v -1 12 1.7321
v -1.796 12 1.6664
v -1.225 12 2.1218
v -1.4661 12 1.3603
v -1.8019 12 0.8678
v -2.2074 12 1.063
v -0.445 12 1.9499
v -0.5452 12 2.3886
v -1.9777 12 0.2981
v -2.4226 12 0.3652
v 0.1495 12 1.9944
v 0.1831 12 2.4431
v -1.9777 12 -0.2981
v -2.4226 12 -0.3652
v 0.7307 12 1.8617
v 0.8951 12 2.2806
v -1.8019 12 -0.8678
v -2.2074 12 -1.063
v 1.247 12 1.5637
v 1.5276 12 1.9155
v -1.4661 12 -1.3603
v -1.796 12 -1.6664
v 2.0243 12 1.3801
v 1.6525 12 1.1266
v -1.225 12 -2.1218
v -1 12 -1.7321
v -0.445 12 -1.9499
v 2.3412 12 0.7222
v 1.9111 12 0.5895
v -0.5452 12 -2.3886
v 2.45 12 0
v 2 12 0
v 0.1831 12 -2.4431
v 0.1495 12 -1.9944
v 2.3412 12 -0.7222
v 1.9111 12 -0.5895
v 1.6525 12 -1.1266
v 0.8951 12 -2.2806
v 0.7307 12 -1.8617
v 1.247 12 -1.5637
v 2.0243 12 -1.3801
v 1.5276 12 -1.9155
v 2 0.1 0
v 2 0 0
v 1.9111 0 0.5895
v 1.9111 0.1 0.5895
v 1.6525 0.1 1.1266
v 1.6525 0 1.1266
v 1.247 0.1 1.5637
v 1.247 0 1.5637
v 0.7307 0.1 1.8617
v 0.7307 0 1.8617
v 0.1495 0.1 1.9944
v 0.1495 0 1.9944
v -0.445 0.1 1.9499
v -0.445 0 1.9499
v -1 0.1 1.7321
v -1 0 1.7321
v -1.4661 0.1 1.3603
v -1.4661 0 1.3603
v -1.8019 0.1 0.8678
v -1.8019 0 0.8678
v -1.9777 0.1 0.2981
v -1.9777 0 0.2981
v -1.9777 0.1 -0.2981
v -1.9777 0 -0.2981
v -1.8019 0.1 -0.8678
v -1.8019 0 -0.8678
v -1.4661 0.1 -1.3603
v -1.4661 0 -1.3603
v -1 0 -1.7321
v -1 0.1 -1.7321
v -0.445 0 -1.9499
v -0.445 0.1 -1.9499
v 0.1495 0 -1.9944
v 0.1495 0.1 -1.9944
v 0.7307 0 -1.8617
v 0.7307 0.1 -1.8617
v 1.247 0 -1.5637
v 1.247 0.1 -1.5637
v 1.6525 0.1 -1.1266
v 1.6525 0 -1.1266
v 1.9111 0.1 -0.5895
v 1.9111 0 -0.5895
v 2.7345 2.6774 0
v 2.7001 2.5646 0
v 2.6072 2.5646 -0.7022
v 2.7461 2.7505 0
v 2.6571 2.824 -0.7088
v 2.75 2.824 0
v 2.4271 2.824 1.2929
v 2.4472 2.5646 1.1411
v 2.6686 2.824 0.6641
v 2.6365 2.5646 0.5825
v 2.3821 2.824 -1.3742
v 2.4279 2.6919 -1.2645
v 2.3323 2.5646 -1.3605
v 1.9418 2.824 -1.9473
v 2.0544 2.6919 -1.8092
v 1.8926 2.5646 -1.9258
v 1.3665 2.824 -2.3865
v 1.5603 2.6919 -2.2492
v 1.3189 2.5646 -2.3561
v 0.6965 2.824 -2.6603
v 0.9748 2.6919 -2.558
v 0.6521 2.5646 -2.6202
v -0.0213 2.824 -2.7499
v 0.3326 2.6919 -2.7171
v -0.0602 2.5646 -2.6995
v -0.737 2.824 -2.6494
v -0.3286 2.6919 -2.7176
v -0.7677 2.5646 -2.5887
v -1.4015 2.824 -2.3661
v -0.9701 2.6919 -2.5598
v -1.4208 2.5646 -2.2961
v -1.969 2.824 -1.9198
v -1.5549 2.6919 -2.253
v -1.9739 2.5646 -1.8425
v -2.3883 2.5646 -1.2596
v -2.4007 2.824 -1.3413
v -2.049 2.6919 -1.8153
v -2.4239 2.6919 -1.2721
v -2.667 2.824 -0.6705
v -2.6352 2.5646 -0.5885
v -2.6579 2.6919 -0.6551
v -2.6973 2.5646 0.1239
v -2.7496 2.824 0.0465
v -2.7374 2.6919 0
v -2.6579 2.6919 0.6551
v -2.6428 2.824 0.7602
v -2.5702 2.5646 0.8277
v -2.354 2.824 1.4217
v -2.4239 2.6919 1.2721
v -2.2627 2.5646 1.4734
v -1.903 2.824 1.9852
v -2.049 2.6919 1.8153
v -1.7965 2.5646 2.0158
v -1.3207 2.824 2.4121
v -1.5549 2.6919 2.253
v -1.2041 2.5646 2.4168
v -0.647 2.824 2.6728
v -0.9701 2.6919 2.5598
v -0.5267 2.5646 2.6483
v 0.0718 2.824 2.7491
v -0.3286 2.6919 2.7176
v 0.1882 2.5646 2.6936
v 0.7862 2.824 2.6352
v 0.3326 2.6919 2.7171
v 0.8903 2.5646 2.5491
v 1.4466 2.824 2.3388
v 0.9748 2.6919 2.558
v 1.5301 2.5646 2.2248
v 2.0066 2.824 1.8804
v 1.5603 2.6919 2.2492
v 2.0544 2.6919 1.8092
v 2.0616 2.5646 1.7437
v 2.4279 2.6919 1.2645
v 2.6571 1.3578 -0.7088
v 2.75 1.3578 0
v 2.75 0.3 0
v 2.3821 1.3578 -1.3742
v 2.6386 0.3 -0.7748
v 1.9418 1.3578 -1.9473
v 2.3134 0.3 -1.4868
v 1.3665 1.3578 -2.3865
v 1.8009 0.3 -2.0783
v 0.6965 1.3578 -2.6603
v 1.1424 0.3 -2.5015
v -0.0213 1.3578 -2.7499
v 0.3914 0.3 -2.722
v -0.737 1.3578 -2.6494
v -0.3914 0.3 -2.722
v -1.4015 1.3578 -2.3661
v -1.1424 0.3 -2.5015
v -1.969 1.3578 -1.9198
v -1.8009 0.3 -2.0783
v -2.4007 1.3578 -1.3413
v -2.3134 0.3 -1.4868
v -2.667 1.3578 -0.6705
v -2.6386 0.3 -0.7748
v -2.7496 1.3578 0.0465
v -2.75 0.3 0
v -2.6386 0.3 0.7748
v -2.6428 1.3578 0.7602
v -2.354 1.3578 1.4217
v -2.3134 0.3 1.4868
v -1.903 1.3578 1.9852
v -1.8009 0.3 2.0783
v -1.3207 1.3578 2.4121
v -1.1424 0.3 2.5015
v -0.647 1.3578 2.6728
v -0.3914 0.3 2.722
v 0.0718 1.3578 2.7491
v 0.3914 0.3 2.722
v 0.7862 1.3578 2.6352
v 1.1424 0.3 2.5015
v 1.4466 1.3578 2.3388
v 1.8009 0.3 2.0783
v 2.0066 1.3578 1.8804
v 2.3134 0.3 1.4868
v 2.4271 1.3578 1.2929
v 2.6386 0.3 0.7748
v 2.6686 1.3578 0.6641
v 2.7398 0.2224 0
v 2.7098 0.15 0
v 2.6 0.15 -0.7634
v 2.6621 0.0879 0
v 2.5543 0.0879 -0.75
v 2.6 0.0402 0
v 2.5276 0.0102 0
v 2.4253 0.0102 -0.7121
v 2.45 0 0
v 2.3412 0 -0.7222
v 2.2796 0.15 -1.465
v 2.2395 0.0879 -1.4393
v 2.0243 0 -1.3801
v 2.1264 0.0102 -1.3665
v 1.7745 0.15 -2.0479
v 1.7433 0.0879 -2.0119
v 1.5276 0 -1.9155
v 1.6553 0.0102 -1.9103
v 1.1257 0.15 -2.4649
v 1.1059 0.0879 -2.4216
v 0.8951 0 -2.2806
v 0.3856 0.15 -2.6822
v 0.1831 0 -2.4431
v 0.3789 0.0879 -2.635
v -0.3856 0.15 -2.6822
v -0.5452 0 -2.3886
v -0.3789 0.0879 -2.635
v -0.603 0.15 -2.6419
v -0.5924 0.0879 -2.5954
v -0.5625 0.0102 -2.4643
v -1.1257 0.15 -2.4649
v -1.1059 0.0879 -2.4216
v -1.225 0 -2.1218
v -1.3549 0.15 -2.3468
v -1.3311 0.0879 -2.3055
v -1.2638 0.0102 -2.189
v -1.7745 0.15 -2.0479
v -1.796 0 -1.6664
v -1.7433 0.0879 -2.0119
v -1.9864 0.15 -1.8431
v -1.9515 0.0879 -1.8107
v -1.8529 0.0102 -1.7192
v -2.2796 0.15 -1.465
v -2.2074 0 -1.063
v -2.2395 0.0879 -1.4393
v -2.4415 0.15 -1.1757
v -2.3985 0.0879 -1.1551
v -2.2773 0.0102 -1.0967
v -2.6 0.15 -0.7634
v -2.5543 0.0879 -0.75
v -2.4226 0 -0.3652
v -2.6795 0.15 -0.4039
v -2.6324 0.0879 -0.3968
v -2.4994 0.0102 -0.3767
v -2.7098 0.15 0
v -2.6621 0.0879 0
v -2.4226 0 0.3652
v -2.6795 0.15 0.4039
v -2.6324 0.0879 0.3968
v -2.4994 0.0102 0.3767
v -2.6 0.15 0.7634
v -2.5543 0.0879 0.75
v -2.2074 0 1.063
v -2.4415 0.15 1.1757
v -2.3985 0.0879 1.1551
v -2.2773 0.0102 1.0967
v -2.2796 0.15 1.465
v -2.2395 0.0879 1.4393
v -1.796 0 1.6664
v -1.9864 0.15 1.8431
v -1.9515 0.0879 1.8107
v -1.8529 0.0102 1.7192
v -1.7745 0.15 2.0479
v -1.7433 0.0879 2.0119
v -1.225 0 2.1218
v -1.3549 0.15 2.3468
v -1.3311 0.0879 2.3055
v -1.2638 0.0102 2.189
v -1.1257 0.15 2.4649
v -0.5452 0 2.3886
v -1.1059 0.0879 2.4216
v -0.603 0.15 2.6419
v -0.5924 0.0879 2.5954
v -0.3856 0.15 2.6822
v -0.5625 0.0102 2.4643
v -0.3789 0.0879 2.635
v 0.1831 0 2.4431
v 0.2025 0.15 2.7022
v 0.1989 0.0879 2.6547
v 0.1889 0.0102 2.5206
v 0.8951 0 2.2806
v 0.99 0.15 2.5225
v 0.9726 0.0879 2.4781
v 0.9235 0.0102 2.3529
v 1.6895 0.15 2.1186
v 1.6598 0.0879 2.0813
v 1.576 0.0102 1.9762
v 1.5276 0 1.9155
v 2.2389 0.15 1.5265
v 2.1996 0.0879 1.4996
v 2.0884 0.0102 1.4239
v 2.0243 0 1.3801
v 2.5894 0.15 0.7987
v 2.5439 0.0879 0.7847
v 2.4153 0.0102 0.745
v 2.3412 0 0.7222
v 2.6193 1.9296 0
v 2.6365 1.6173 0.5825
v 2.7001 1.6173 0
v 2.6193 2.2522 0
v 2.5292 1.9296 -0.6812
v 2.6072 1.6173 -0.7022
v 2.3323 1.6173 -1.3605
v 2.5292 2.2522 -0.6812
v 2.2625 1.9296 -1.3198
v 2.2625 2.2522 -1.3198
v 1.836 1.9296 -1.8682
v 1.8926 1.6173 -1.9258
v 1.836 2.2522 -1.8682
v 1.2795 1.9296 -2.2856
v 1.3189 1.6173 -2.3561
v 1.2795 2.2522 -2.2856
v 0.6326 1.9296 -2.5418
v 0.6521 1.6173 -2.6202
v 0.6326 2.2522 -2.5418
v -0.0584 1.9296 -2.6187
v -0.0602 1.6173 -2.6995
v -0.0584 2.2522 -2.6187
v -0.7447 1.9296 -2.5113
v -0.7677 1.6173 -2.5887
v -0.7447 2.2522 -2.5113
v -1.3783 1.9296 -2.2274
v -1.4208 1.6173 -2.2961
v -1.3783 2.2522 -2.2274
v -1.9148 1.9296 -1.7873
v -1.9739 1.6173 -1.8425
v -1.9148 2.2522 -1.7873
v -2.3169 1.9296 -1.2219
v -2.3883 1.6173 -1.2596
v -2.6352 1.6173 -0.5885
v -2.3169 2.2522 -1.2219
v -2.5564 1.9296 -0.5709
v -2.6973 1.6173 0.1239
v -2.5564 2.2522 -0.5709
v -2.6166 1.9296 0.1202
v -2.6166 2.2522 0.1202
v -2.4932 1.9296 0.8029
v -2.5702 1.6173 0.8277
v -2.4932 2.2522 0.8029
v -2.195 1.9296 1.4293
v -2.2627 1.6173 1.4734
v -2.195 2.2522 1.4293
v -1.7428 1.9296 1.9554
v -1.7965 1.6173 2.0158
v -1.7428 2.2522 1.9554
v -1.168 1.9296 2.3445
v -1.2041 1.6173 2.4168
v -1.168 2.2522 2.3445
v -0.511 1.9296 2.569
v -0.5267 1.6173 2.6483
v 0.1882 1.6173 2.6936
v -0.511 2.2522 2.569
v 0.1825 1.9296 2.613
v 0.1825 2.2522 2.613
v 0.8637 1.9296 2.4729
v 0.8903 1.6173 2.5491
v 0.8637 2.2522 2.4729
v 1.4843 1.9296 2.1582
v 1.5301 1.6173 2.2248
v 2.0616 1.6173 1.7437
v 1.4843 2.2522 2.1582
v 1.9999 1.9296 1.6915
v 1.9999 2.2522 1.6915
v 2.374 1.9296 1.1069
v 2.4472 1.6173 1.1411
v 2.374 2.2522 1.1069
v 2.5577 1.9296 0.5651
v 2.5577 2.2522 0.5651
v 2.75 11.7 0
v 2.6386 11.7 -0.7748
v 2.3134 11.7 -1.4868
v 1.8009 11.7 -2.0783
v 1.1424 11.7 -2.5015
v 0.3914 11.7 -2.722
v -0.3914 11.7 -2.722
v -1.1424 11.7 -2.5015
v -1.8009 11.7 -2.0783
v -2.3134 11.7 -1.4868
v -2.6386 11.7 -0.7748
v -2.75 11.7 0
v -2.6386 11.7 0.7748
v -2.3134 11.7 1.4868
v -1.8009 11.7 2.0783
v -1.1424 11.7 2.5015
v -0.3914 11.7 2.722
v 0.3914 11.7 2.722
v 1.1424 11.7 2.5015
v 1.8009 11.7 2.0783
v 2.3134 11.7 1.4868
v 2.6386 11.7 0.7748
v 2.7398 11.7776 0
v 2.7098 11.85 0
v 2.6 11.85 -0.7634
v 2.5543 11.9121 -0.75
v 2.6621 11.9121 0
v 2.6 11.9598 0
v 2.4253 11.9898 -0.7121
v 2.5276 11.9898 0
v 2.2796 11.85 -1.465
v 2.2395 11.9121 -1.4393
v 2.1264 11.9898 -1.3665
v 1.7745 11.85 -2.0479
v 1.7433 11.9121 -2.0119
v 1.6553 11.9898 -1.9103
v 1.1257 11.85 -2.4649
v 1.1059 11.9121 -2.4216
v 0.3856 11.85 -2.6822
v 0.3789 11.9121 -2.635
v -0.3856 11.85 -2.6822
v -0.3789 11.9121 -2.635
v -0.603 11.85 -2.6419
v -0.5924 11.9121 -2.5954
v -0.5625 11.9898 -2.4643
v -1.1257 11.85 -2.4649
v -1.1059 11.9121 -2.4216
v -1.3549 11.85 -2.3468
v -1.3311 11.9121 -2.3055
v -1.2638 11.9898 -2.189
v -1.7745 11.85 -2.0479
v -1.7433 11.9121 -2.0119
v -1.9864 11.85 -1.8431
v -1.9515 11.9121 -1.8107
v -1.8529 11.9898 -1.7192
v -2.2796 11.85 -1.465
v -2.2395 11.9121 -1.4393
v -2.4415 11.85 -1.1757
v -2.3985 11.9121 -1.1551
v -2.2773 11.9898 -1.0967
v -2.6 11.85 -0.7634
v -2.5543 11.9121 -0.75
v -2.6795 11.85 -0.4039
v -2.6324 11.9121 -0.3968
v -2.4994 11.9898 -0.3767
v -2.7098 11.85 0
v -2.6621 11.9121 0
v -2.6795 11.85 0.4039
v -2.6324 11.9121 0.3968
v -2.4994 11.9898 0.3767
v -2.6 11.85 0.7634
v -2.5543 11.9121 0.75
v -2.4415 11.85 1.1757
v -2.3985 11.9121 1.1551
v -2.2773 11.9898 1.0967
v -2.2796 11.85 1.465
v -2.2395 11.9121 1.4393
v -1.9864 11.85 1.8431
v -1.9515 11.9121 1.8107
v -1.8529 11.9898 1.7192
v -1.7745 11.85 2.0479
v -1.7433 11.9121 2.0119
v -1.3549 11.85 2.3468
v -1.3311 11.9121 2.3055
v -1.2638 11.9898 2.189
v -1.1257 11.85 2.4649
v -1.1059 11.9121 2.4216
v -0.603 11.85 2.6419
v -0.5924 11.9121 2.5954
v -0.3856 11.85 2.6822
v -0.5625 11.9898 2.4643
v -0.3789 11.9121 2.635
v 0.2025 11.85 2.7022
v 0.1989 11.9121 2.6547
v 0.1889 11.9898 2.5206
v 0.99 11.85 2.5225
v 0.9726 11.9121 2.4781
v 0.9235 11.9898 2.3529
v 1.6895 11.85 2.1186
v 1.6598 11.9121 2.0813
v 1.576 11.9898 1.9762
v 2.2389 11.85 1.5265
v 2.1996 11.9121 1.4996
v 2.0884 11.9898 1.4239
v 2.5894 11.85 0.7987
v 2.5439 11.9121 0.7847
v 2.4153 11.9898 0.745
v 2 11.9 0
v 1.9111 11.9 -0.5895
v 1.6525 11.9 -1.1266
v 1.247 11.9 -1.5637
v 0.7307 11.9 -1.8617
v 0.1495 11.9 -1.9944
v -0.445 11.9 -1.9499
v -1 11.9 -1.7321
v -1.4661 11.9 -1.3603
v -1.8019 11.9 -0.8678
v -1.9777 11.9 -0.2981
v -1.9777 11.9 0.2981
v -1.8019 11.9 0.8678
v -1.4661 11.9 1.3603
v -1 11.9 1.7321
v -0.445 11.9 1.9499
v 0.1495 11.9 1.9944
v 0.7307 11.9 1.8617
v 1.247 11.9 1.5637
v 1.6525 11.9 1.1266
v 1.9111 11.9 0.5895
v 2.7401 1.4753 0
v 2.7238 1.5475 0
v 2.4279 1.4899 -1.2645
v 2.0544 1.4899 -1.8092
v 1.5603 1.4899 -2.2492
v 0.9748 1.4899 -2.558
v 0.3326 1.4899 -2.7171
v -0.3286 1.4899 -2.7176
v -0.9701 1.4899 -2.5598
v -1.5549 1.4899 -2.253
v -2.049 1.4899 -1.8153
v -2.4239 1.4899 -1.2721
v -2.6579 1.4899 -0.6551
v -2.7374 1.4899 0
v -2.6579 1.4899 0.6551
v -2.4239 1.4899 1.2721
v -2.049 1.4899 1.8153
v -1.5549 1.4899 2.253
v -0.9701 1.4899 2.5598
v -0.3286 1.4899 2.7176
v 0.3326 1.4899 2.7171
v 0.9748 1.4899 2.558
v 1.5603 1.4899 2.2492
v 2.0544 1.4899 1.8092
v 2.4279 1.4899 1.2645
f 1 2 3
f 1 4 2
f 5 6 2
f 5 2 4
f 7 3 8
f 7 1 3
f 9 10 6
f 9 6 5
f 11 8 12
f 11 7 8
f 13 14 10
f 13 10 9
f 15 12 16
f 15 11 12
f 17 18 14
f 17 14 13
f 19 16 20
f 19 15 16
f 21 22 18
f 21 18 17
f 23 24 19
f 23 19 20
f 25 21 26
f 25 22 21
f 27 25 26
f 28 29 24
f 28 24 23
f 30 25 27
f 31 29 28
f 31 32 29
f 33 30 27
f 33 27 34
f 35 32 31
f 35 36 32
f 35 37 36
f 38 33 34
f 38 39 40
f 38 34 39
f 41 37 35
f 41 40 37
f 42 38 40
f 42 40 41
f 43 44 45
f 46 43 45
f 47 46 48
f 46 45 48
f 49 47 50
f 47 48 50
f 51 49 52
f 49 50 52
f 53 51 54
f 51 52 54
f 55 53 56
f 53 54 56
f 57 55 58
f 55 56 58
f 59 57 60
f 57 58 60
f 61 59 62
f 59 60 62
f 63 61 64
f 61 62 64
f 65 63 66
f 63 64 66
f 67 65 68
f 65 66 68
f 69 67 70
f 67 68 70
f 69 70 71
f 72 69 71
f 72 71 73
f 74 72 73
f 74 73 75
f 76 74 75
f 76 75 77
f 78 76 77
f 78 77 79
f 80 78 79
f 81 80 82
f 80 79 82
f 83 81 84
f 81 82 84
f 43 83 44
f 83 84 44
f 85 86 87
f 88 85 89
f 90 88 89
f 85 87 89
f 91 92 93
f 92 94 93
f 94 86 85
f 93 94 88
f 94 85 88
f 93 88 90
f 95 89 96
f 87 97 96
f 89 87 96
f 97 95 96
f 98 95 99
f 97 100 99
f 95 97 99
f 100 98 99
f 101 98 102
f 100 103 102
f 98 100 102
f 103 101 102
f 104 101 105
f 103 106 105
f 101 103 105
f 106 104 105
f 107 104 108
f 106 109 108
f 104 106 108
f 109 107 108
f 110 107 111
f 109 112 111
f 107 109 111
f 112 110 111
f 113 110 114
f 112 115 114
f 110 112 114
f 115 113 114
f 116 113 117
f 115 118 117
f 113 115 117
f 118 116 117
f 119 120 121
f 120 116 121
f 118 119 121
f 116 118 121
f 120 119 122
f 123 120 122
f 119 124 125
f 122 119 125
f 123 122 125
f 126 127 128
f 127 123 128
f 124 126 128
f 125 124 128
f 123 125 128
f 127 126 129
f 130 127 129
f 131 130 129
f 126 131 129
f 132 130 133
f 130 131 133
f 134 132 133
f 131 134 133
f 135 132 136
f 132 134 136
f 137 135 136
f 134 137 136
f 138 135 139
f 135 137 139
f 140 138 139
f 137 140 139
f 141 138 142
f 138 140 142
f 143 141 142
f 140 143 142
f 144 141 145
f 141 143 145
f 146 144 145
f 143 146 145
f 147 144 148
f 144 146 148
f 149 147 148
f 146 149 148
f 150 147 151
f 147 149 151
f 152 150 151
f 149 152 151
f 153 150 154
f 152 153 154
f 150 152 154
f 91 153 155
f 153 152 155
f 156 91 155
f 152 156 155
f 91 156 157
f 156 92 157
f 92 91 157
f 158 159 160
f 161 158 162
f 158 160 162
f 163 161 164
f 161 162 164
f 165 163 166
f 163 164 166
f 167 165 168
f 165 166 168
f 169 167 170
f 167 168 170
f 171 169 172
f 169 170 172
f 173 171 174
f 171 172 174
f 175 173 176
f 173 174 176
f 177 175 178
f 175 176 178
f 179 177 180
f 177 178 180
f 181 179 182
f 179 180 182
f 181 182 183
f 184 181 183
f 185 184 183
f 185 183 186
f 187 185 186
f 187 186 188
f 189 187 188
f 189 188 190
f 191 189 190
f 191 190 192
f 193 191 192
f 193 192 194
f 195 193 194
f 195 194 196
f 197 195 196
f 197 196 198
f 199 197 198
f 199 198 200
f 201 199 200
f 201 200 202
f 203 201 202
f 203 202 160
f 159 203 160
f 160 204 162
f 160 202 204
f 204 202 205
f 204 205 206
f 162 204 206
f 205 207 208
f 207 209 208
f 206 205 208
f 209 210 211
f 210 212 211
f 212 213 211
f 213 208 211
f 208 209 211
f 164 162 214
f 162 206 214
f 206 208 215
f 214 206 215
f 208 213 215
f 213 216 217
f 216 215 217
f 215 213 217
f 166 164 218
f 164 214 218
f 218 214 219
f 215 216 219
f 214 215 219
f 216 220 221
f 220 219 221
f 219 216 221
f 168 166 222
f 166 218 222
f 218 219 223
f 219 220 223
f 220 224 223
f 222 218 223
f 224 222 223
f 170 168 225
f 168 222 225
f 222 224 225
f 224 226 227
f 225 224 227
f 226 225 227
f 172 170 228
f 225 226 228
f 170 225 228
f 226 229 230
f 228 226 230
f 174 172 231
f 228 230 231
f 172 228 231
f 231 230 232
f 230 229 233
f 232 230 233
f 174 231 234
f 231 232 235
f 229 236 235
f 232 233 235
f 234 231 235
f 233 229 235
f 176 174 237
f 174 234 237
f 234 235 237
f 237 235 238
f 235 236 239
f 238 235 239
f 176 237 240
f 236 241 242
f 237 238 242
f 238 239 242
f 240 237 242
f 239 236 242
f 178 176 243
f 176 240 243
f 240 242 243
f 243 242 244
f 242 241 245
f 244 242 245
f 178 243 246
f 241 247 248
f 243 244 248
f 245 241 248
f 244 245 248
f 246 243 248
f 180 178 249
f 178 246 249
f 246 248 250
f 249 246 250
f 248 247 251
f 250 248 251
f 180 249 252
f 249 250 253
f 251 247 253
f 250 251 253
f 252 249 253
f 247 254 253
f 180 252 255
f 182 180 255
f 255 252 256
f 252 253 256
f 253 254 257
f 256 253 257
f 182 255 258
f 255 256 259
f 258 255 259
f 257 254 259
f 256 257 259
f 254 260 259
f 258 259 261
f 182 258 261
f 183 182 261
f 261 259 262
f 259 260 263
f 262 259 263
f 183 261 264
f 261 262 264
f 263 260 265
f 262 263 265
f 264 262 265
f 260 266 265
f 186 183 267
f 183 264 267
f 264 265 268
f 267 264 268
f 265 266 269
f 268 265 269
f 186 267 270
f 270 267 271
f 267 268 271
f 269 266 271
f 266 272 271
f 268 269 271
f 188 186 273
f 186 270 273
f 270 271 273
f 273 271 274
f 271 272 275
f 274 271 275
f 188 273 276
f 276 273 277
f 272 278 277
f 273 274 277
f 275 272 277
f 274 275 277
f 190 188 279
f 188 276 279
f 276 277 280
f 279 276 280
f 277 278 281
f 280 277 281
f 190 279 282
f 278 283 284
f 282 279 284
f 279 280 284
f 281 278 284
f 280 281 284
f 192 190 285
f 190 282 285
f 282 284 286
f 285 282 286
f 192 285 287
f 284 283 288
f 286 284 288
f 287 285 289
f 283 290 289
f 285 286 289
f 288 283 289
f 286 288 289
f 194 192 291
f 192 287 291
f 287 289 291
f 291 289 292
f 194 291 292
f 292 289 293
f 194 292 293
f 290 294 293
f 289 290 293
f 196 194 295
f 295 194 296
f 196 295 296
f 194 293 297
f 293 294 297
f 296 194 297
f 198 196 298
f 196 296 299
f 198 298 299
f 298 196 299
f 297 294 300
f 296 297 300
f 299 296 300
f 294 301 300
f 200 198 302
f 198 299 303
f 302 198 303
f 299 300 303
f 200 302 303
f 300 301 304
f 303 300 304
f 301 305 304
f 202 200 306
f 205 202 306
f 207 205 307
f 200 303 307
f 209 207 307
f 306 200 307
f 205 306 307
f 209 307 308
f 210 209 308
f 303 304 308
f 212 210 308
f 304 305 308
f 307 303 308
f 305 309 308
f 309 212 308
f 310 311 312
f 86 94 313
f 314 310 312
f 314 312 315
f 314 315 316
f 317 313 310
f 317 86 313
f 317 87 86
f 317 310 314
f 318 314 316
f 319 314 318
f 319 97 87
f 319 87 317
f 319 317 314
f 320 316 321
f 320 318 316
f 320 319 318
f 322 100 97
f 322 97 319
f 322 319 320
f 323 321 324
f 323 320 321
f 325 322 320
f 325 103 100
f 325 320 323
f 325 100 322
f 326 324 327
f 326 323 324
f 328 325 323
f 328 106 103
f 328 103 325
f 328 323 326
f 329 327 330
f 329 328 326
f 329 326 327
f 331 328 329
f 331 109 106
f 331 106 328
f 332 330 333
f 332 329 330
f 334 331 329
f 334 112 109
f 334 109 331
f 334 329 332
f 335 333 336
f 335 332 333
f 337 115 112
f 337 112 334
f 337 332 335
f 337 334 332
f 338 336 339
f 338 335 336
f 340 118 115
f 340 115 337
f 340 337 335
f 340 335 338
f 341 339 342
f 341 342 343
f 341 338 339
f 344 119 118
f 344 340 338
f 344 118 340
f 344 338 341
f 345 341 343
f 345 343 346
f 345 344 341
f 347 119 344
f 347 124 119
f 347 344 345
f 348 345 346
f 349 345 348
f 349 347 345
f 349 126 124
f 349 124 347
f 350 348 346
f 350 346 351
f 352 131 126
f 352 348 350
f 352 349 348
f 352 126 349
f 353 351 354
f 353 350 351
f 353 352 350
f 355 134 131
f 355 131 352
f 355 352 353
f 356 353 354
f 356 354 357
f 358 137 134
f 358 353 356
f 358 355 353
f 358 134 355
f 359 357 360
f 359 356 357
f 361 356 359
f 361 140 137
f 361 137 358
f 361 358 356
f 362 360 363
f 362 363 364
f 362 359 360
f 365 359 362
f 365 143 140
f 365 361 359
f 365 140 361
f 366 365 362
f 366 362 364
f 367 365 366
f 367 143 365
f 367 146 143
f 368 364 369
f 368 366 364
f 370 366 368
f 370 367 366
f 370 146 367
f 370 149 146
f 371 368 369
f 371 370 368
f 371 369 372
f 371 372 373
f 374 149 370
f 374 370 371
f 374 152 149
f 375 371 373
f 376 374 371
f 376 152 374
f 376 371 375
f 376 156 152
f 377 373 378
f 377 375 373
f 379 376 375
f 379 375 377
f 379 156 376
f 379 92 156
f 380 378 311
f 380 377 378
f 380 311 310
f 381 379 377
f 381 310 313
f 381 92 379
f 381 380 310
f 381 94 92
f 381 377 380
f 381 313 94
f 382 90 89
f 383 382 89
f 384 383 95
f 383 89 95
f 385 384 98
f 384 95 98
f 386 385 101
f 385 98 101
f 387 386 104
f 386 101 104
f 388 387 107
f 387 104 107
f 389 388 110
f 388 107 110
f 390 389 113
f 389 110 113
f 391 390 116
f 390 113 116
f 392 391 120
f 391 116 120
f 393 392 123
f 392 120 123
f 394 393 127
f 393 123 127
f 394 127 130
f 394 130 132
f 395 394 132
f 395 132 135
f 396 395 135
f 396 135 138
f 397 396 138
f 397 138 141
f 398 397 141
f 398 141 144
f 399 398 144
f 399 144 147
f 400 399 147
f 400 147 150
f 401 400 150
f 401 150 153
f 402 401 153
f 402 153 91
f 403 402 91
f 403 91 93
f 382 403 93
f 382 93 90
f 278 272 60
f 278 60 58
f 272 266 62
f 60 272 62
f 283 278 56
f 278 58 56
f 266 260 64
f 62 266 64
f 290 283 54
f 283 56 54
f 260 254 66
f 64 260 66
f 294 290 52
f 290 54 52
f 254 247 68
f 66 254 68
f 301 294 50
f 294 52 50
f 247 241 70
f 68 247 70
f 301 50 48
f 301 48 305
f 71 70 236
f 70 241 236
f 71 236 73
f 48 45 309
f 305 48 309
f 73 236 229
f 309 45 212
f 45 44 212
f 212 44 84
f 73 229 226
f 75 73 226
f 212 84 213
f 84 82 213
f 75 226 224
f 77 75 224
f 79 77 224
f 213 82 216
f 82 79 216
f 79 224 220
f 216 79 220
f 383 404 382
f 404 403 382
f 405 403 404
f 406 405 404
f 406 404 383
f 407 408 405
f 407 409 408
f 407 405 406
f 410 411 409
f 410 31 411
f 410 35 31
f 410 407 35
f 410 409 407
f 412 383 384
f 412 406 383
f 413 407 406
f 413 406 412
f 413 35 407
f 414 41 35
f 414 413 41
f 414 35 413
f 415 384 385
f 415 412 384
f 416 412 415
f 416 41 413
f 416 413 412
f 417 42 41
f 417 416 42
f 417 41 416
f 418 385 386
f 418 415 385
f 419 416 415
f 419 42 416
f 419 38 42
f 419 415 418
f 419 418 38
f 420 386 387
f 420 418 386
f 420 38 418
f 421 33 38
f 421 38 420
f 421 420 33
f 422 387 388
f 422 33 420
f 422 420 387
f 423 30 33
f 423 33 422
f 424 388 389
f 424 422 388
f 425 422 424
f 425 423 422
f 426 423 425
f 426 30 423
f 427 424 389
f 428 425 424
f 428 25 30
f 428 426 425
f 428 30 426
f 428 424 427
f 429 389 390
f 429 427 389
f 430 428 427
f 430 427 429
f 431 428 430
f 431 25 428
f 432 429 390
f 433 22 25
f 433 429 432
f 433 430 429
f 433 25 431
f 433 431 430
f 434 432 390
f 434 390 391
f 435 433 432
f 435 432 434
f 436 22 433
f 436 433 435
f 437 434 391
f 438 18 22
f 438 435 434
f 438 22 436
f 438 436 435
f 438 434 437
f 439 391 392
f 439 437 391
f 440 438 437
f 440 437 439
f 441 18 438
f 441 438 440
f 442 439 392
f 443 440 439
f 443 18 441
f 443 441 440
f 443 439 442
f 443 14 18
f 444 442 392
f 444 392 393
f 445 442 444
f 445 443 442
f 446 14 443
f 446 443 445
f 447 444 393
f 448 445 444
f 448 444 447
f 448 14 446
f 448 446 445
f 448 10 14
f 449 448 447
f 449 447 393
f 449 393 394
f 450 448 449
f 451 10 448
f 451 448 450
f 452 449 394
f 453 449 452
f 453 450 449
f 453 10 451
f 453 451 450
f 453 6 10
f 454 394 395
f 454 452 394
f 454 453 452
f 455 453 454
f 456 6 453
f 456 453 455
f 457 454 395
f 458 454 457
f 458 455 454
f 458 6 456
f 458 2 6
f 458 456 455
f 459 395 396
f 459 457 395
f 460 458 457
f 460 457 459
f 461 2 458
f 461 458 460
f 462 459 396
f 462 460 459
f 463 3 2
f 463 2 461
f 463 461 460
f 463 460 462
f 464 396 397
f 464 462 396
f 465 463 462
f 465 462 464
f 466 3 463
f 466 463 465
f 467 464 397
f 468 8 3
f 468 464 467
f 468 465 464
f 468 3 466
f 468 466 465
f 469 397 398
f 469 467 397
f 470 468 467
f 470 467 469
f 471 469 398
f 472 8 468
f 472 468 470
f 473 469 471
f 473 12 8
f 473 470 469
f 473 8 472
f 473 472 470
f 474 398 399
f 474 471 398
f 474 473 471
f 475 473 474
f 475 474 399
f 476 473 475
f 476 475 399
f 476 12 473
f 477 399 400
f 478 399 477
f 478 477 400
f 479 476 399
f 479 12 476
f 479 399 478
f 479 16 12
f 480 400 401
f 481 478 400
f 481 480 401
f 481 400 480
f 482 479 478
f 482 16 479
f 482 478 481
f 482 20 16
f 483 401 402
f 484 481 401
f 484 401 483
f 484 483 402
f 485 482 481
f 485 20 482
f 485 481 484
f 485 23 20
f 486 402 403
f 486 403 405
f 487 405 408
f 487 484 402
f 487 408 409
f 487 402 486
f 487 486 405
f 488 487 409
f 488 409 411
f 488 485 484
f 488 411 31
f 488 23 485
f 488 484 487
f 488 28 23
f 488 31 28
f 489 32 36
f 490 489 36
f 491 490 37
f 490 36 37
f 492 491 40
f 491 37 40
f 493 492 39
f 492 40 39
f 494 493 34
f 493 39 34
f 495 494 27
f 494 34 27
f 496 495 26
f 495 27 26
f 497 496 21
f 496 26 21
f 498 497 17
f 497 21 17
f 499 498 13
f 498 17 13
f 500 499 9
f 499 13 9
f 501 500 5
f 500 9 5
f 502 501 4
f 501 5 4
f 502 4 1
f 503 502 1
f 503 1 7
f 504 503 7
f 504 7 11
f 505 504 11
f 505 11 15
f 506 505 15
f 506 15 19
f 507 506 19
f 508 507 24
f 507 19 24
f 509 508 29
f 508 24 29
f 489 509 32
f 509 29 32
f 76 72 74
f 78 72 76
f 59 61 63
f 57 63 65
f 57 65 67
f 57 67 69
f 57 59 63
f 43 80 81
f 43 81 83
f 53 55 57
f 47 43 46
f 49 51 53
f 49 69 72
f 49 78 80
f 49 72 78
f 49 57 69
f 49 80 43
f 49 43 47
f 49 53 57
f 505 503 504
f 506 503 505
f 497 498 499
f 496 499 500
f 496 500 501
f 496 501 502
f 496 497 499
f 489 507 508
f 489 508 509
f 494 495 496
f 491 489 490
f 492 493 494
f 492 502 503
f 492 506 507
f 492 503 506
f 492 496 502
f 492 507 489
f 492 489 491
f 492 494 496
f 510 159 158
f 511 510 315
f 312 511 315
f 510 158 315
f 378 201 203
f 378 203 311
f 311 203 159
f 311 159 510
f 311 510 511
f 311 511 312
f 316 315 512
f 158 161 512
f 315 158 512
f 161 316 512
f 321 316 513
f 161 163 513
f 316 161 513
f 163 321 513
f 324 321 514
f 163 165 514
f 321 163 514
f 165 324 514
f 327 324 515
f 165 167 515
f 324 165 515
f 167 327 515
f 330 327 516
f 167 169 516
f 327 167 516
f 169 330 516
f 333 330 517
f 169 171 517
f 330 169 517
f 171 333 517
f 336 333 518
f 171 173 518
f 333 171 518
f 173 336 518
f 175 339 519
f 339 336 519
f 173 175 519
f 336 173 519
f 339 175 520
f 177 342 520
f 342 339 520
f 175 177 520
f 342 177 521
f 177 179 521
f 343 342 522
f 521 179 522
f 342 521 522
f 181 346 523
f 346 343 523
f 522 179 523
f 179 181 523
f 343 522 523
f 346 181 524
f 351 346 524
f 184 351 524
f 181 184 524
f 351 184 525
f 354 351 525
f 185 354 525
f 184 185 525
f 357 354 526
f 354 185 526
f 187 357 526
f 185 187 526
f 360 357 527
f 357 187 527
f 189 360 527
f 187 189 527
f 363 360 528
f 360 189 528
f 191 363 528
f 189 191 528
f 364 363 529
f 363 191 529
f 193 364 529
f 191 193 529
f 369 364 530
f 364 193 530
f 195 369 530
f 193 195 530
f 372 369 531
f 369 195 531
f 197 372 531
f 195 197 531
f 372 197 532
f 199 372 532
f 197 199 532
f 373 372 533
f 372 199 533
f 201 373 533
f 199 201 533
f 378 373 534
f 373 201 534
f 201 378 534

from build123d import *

# Parameters (mm, degrees)
SKETCH1_R           = 2.75
BOSS_EXTRUDE1_DEPTH = 12
FILLET2_R           = 0.3
FILLET3_R           = 0.3
FILLET4_R           = 0.7
SKETCH3_R           = 2
CUT_EXTRUDE1_DEPTH  = 0.1
SKETCH5_R           = 2
CUT_EXTRUDE3_DEPTH  = 0.1


with BuildPart() as part:
    # Sketch1 → Boss-Extrude1 (new body)
    with BuildSketch(Plane(origin=(0, 0, 0), x_dir=(1, 0, 0), z_dir=(0, 1, 0))):
        Circle(SKETCH1_R)
    extrude(amount=BOSS_EXTRUDE1_DEPTH)

    # Sketch2 → Cut-Revolve1 (revolve, cut)
    with BuildSketch(Plane.XY):
        with BuildLine():
            Line((2.75, 2.67418437), (2.75, 1.507628734))
            ThreePointArc((2.75, 1.507628734), (2.609122054, 2.090906552), (2.75, 2.67418437))
        make_face()
    revolve(axis=Axis((0, 0, 0), (0, 1, 0)), mode=Mode.SUBTRACT)

    # Fillet2
    fillet2_edges = [part.edges().sort_by_distance(p)[0] for p in [
        (-2.75, 12, 0),
    ]]
    fillet(fillet2_edges, radius=FILLET2_R)

    # Fillet3
    fillet3_edges = [part.edges().sort_by_distance(p)[0] for p in [
        (-2.75, 0, 0),
    ]]
    fillet(fillet3_edges, radius=FILLET3_R)

    # Fillet4
    fillet4_edges = [part.edges().sort_by_distance(p)[0] for p in [
        (-2.75, 1.507628734, 0),
        (-2.75, 2.67418437, 0),
    ]]
    fillet(fillet4_edges, radius=FILLET4_R)

    # Sketch3 → Cut-Extrude1 (cut)
    with BuildSketch(Plane(origin=(0, 12, 0), x_dir=(1, 0, 0), z_dir=(0, 1, 0))):
        Circle(SKETCH3_R)
    extrude(amount=-CUT_EXTRUDE1_DEPTH, mode=Mode.SUBTRACT)

    # Sketch5 → Cut-Extrude3 (cut)
    with BuildSketch(Plane.XZ):
        Circle(SKETCH5_R)
    extrude(amount=-CUT_EXTRUDE3_DEPTH, mode=Mode.SUBTRACT)


solid = part.part
